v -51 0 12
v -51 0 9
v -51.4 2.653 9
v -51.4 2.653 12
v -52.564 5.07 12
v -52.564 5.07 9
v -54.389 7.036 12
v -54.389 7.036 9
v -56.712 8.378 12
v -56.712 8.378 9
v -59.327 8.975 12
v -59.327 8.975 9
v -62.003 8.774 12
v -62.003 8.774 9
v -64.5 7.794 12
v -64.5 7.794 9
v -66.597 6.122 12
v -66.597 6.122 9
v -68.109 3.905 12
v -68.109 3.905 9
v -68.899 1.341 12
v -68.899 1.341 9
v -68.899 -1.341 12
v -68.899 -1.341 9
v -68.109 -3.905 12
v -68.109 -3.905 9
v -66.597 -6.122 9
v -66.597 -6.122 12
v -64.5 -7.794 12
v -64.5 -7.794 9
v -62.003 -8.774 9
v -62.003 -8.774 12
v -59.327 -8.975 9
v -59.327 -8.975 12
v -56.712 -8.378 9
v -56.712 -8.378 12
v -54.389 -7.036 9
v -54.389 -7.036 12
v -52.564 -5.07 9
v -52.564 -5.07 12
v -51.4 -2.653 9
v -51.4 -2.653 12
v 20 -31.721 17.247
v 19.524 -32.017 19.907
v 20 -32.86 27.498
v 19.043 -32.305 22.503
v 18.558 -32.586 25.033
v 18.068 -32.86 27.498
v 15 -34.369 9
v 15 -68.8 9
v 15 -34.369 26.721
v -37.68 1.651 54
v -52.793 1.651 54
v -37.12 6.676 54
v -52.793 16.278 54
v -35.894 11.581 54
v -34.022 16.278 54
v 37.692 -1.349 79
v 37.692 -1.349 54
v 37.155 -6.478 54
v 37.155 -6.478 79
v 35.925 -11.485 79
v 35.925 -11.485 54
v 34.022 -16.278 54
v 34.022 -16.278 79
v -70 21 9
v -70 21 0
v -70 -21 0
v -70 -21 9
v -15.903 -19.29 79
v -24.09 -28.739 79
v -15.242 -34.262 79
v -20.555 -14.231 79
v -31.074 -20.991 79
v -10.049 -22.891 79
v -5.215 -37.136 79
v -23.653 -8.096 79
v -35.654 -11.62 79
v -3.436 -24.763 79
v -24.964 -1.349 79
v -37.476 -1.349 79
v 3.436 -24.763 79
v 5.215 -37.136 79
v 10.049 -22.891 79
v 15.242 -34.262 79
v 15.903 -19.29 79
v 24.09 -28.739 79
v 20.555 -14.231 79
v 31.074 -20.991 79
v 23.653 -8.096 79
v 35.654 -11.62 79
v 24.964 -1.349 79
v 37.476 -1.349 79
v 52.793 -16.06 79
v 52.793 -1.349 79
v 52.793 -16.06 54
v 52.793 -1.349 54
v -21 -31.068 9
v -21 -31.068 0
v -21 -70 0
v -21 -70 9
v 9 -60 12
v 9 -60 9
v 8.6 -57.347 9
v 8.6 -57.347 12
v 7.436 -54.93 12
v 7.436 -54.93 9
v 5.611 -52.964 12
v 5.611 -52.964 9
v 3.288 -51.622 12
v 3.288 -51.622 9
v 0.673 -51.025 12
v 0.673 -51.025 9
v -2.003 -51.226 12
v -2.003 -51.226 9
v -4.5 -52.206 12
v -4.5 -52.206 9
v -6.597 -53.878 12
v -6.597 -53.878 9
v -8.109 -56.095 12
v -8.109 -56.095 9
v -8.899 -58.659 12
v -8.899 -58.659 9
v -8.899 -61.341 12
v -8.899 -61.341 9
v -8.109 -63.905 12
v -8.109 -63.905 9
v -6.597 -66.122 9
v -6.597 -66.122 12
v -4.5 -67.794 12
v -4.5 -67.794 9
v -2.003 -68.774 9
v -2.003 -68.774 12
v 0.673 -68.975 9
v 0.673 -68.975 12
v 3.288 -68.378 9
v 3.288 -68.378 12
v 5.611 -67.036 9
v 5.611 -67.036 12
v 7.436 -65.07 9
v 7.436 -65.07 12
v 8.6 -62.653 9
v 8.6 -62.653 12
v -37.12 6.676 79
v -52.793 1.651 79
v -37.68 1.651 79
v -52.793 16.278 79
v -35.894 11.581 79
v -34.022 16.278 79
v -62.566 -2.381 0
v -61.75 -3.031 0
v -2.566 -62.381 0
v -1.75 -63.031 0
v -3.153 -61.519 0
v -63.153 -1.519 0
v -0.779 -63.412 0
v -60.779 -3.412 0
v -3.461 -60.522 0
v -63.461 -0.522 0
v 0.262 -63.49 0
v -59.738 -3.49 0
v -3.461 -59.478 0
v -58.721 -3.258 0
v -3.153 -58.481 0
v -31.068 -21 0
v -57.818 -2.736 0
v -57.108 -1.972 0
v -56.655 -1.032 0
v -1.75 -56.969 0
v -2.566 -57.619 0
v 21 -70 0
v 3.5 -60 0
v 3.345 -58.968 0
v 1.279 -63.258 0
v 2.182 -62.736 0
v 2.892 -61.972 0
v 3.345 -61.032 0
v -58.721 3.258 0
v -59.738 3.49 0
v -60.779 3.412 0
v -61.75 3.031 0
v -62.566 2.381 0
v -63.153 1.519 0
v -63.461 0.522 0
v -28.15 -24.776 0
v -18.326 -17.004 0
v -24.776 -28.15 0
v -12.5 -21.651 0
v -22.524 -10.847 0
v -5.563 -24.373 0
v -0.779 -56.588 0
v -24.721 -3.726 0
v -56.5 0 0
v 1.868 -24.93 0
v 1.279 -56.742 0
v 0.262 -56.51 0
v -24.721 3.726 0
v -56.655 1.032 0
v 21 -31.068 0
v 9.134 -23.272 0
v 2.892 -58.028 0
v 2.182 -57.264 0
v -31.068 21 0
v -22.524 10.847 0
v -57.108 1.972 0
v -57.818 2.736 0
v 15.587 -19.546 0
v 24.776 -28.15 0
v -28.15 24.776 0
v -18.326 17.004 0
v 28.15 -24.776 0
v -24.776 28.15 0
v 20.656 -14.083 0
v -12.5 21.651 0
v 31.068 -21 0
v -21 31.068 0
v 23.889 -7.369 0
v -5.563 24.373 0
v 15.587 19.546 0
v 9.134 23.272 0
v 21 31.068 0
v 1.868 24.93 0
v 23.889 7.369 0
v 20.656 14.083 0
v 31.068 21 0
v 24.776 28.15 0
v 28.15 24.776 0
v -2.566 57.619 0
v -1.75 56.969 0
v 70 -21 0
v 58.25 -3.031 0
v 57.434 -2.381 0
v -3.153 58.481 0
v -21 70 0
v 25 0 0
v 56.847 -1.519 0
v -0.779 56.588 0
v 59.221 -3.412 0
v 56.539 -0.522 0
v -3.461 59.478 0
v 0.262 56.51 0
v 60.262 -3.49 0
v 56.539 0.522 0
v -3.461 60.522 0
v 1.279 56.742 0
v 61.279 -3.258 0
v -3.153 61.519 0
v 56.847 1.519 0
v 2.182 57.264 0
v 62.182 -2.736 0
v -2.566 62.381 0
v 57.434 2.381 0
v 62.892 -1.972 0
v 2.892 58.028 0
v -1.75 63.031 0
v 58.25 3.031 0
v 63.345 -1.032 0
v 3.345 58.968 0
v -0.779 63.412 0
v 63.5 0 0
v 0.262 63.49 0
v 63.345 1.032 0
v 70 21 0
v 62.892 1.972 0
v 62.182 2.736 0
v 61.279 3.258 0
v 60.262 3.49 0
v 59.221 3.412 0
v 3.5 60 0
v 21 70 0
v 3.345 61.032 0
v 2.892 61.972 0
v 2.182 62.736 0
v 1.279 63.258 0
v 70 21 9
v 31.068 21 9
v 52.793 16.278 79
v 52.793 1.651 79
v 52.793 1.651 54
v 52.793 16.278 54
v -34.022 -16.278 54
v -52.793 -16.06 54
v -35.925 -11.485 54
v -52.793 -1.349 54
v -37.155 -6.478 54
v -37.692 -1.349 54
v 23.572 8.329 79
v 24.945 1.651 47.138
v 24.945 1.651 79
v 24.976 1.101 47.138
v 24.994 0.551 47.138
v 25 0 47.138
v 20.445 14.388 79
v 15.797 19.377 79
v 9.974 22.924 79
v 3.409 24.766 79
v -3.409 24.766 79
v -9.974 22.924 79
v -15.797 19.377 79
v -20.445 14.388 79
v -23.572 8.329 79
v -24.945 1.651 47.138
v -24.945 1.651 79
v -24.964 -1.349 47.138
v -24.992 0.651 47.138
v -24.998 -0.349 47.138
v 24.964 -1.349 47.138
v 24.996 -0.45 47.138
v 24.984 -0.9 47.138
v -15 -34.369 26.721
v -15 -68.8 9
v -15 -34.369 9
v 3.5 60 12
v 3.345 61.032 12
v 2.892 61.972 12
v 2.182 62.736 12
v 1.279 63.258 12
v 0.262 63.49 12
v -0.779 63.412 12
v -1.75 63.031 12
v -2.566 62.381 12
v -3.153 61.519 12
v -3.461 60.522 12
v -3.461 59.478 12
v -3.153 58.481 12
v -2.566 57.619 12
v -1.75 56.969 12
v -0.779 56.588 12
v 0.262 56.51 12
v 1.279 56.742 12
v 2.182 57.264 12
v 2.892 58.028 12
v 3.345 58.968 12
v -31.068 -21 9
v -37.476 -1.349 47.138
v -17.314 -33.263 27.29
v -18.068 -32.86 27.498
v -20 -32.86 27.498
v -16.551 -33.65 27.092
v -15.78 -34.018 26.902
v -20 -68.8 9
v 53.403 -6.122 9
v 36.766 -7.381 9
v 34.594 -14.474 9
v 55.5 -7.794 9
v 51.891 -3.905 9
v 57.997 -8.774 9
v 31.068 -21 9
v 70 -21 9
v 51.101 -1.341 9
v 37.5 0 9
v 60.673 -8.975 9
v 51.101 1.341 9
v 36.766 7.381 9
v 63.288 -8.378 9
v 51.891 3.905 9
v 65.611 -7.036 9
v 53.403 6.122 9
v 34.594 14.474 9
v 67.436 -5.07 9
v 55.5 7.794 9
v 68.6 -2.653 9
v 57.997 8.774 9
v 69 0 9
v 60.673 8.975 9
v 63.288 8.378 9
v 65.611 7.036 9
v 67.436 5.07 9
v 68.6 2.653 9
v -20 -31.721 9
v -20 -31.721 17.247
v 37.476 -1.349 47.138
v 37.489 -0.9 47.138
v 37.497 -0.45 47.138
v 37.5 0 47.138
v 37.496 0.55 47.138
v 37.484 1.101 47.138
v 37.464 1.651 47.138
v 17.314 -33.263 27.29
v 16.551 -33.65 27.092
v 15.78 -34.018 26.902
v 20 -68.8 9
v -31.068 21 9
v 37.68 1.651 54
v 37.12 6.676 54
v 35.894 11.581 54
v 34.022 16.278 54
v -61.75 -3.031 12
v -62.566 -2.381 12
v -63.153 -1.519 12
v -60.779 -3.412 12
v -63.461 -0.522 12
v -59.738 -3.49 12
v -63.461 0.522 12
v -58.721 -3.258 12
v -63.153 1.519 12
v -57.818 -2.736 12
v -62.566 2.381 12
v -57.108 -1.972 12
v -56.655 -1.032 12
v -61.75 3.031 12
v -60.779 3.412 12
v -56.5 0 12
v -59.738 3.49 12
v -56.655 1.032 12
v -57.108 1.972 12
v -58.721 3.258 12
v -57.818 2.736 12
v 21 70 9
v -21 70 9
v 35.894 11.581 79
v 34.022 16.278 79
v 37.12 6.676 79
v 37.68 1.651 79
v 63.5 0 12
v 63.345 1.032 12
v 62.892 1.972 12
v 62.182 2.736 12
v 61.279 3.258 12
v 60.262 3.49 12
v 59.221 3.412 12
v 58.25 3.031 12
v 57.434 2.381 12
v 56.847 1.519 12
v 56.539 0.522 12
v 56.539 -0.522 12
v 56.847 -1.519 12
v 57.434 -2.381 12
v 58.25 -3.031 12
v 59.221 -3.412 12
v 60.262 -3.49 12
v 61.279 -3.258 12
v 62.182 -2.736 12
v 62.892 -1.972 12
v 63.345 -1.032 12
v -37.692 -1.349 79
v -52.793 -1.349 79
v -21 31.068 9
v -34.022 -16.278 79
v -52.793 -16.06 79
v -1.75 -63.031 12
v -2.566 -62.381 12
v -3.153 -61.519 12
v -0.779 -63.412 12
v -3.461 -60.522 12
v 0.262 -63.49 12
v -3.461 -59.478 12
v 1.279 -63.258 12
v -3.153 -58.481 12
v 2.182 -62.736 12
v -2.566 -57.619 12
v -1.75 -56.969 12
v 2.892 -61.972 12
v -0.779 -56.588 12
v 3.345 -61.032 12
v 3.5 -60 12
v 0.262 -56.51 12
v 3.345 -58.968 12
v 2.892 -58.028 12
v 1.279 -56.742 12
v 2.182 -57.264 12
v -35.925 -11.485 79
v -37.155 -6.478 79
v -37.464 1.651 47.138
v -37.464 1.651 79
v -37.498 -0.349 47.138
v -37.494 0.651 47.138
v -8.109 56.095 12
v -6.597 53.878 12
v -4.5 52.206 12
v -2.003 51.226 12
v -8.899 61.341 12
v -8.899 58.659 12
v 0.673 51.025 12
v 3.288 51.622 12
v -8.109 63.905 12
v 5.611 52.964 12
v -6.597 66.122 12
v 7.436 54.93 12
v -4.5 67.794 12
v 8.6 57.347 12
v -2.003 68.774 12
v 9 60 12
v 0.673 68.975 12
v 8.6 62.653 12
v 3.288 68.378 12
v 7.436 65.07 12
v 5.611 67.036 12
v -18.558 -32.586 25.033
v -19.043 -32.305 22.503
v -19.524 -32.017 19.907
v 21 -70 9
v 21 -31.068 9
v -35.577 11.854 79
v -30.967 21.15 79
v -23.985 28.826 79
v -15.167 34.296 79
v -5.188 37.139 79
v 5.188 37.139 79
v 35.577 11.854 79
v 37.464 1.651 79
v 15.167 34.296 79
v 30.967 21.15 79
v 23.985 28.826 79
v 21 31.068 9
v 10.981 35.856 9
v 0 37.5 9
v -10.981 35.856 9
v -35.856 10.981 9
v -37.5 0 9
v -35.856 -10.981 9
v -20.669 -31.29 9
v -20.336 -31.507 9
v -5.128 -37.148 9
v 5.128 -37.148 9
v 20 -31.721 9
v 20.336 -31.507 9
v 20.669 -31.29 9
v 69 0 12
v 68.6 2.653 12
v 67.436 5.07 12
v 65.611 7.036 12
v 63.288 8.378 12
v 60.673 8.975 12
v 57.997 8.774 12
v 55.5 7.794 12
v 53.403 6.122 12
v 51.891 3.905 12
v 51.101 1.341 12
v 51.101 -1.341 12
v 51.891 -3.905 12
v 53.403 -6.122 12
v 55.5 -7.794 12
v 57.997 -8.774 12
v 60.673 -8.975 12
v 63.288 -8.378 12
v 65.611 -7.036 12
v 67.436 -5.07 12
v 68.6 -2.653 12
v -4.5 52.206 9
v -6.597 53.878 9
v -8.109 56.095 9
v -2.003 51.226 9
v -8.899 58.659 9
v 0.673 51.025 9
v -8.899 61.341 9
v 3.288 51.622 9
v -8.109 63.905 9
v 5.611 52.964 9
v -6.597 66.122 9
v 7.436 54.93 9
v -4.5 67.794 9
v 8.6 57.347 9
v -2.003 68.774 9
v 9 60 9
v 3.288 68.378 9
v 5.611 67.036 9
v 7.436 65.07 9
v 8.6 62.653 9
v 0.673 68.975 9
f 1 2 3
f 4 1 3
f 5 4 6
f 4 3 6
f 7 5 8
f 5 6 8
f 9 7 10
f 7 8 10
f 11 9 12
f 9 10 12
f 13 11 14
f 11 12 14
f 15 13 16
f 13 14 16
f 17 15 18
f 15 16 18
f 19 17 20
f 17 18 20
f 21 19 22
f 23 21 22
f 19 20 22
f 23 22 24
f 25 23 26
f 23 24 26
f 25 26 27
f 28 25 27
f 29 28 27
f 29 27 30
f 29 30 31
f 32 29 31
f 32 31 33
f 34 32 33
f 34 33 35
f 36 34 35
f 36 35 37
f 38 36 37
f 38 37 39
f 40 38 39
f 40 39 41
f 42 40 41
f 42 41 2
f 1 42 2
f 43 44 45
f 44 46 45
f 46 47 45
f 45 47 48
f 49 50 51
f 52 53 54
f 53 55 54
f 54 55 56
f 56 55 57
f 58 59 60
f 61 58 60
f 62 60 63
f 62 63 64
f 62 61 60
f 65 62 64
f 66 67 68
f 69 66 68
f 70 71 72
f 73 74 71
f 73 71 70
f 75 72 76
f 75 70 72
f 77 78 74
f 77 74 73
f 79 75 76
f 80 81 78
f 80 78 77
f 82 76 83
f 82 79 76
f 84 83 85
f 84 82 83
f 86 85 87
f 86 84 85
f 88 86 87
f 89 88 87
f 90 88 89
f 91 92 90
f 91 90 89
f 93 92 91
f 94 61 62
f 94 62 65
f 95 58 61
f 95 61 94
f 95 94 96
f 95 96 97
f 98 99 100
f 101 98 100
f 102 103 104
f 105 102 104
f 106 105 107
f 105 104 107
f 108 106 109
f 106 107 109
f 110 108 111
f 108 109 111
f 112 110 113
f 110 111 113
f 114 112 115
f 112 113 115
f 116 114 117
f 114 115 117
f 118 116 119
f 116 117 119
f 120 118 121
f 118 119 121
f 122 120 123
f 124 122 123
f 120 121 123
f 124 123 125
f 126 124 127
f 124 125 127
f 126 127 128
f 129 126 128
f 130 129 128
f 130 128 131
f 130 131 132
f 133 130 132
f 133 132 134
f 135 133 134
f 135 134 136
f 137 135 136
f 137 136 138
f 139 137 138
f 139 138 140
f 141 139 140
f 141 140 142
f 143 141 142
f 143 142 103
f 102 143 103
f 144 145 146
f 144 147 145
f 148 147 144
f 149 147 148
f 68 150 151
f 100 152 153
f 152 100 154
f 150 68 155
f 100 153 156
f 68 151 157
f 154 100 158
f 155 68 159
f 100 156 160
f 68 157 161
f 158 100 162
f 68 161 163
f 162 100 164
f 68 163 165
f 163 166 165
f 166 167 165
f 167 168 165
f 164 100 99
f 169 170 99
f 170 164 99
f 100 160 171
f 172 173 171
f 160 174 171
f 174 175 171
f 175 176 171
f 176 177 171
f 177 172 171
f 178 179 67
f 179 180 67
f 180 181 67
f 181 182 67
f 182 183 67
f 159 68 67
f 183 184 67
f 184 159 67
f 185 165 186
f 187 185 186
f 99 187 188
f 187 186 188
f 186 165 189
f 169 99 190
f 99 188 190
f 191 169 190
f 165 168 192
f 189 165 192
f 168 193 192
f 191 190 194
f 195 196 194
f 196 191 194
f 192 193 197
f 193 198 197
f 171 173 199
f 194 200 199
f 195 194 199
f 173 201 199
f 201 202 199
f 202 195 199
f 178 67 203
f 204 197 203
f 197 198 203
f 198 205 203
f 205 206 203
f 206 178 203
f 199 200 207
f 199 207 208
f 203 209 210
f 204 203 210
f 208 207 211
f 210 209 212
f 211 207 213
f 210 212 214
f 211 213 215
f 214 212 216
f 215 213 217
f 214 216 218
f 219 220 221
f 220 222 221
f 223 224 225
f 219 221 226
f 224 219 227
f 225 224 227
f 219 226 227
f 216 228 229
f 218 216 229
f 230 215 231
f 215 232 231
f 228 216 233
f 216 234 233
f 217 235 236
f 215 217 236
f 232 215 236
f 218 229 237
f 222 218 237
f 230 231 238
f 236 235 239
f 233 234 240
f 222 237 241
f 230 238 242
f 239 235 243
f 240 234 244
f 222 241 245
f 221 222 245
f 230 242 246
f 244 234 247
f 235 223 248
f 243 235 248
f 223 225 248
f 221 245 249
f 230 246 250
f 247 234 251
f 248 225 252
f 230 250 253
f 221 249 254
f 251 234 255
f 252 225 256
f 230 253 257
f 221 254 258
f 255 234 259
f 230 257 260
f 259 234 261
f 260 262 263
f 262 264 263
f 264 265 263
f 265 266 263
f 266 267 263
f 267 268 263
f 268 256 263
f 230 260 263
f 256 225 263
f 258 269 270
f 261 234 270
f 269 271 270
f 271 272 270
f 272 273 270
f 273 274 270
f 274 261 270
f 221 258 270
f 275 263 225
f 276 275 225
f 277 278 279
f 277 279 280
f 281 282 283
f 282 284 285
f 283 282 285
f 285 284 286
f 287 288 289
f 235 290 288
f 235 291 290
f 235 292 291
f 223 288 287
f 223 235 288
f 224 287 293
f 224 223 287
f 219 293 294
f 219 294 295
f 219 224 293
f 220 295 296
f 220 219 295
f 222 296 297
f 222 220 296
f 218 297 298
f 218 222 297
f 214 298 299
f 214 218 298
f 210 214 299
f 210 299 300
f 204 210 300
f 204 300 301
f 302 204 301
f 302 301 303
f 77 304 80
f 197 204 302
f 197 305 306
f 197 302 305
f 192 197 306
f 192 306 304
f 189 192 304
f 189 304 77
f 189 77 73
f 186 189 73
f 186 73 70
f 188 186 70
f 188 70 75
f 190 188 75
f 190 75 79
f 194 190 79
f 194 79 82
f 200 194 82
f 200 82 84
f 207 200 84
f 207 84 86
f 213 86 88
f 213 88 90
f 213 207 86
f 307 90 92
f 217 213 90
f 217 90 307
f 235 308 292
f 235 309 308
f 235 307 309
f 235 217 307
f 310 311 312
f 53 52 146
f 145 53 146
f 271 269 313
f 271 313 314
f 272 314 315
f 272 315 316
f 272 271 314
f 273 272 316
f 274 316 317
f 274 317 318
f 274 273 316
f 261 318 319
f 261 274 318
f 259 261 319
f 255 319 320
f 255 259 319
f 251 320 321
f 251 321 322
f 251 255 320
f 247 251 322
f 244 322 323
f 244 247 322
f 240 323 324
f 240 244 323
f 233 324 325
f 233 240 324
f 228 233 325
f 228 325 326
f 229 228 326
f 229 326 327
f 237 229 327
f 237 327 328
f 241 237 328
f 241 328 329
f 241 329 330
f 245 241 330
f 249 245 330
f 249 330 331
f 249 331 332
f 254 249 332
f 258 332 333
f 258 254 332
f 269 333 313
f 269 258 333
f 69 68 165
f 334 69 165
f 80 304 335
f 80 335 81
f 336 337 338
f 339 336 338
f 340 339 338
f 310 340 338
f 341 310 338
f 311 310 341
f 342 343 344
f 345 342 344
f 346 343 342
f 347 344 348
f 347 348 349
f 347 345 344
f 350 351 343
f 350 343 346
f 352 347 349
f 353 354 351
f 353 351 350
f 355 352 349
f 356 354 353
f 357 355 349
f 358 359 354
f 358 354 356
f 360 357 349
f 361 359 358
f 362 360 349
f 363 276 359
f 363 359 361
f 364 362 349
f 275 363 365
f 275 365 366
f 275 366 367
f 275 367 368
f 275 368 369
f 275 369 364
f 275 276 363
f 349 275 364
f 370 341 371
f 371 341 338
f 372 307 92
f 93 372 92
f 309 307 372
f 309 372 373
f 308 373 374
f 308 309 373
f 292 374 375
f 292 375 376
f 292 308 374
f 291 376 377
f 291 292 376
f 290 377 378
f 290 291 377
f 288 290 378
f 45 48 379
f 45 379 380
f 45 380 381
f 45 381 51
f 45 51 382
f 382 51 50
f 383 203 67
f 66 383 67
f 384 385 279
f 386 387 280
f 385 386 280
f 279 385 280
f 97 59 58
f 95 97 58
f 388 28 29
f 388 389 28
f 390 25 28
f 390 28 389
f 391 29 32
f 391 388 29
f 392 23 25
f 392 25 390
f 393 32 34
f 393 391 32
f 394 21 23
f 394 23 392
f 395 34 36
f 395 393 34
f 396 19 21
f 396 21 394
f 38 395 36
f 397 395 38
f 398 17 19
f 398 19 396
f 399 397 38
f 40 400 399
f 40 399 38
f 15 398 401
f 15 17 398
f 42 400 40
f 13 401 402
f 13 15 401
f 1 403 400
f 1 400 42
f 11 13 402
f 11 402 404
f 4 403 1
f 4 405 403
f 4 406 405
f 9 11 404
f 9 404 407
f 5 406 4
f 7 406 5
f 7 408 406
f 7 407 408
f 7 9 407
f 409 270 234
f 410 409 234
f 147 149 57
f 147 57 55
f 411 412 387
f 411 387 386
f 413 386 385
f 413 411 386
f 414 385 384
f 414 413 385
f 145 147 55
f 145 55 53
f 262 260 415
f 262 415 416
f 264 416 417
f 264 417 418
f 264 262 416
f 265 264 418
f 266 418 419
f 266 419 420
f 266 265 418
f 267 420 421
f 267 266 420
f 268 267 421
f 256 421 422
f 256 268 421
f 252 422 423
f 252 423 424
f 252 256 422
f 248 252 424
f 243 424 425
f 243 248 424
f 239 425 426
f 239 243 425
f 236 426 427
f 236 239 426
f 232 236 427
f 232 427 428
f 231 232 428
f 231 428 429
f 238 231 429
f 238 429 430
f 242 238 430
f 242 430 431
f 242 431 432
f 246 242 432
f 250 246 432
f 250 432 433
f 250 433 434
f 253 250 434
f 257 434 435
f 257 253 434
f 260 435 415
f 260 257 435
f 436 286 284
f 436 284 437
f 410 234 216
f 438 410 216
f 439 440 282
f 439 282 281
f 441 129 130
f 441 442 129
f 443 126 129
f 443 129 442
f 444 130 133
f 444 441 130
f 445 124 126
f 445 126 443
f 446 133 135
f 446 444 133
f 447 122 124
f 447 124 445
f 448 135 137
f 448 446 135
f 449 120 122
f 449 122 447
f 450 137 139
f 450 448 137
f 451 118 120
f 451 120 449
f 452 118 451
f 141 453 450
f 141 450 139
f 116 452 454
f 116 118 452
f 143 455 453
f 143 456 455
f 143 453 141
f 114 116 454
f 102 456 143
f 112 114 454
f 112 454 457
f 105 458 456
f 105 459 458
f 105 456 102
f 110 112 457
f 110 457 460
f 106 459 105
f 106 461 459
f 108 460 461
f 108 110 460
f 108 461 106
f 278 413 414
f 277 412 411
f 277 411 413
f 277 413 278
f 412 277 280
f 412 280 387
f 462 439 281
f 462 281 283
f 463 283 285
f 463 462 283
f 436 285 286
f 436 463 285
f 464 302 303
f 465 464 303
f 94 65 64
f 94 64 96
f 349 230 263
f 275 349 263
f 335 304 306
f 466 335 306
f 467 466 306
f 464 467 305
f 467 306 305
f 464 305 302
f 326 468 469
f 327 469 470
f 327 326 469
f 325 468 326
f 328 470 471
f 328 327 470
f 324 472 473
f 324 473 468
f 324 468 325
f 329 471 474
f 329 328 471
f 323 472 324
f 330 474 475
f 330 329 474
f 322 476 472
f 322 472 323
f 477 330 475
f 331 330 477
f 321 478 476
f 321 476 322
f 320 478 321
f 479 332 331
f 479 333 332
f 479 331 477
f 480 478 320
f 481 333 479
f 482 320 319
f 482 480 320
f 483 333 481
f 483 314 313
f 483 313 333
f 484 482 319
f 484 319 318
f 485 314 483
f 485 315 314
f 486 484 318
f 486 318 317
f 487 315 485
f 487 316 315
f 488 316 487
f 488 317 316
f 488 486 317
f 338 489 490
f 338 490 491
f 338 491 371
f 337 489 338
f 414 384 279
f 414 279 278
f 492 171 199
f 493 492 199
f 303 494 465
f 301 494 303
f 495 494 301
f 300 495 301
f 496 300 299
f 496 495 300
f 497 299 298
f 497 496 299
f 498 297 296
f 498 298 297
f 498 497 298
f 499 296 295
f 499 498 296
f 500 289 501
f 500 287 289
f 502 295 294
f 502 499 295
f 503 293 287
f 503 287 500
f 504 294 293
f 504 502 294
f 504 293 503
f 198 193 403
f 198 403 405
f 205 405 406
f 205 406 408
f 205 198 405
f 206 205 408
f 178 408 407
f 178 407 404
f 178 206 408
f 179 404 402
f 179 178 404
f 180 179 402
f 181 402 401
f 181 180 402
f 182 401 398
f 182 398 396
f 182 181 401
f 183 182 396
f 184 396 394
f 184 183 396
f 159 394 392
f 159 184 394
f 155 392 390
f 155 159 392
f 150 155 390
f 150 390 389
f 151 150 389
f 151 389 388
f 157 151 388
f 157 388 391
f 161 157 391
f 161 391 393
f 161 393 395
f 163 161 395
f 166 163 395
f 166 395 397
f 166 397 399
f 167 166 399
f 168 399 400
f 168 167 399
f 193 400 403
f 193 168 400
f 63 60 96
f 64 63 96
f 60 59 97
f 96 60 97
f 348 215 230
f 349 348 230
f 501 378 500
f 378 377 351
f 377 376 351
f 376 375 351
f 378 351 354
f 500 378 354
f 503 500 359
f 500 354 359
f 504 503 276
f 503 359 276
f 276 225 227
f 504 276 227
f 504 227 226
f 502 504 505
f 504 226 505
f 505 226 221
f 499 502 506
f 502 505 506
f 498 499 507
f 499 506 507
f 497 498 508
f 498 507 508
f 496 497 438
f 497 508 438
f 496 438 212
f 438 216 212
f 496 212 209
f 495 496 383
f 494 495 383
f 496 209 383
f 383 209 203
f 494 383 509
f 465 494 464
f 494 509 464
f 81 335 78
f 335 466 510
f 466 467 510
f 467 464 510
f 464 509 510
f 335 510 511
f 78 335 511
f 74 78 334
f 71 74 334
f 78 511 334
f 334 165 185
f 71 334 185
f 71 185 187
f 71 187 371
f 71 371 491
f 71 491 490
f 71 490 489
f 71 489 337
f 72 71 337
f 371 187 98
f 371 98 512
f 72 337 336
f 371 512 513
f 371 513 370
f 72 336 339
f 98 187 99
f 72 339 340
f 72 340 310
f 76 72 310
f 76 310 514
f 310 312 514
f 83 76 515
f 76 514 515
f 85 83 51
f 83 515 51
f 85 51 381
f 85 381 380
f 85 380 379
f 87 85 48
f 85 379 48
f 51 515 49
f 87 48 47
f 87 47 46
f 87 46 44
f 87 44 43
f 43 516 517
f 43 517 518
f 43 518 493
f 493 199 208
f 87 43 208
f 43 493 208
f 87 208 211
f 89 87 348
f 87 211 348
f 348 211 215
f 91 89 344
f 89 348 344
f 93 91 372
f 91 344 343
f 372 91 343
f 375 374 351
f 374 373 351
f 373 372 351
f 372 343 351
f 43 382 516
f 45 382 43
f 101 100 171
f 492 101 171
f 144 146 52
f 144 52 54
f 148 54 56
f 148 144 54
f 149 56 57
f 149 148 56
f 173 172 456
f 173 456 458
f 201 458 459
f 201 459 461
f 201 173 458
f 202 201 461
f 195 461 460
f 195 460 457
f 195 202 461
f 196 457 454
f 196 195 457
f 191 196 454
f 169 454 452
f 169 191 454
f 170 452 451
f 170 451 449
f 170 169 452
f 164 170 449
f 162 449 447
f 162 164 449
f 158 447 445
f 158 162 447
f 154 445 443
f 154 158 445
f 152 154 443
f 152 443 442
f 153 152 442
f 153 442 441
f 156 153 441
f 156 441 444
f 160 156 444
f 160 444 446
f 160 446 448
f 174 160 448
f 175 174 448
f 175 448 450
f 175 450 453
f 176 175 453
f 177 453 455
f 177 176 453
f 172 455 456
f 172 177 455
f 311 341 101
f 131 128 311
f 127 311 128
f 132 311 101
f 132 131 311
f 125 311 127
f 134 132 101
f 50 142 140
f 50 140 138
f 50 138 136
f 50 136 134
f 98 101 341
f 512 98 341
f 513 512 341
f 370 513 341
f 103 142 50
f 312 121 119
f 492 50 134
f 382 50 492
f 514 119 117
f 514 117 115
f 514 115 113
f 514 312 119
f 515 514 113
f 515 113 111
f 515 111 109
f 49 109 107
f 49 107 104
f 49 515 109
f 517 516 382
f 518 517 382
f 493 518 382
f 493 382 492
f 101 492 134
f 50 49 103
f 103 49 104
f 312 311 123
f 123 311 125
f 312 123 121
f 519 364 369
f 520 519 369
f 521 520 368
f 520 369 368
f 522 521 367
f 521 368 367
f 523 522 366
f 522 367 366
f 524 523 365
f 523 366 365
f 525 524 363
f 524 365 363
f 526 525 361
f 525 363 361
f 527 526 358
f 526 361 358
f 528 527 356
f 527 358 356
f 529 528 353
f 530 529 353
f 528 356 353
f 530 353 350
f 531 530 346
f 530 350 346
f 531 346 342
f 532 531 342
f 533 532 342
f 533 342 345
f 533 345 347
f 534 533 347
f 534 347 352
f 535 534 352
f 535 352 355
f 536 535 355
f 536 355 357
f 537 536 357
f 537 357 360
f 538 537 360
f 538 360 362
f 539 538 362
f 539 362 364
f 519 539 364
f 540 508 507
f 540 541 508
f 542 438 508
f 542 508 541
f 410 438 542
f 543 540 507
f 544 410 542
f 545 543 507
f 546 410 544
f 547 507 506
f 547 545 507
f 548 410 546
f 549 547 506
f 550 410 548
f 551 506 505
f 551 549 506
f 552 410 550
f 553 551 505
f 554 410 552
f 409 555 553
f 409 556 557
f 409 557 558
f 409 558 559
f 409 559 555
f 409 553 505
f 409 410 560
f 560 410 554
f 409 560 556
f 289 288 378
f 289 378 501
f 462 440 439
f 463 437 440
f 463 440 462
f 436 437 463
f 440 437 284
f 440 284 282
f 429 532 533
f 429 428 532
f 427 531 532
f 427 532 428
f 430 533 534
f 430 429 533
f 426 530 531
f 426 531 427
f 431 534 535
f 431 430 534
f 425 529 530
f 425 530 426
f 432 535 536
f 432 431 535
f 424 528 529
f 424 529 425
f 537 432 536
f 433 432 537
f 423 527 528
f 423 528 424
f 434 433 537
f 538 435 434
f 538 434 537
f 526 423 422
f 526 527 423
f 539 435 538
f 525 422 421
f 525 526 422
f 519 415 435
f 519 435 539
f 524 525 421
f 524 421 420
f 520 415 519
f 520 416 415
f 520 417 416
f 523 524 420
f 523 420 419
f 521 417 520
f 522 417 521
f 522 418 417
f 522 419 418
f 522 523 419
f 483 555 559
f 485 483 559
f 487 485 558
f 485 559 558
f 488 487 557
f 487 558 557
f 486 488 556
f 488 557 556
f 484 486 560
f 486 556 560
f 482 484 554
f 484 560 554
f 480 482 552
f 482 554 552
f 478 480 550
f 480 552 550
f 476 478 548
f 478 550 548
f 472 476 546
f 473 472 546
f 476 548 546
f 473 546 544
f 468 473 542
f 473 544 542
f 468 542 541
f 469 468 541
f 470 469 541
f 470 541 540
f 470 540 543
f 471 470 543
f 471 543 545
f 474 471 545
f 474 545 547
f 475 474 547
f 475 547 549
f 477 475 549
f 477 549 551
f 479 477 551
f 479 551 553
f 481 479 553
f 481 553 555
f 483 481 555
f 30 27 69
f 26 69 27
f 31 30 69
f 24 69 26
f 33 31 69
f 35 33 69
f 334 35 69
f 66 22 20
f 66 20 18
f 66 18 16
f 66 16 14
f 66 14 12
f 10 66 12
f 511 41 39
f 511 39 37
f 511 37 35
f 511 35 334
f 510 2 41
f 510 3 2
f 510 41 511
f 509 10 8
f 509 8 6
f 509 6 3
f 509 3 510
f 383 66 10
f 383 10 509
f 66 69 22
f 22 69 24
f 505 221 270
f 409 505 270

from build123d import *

# Parameters (mm, degrees)
F0_R      = 37.5
F0_R_2    = 25
F1_DEPTH  = 79
F3_DEPTH  = 9
F4_R      = 4
F5_DEPTH  = 10
F6_DEPTH  = 25
F7_R      = 9
F7_R_2    = 3.5
F8_DEPTH  = 12
F12_DEPTH = 25
F9_W      = 3
F9_H      = 35
F13_DEPTH = 70.001
F14_DEPTH = 70.001
F17_DEPTH = 5


# Not quite as in the source:
# - a pattern or mirror of a feature is missing from the dataset's text; its kind, count and spacing are read off the source's solid


with BuildPart() as f1:
    # F0 (on Top) → F1 (new body)
    with BuildSketch(Plane.XY):
        Circle(F0_R)
        Circle(F0_R_2, mode=Mode.SUBTRACT)
    extrude(amount=F1_DEPTH)

    # F2 (on Top) → F3 (join)
    with BuildSketch(Plane.XY):
        with BuildLine():
            Line((-21, 70), (-21, 31.0684727658))
            ThreePointArc((-21, 31.0684727658), (0, 37.5), (21, 31.0684727658))
            Line((21, 31.0684727658), (21, 70))
            Line((21, 70), (-21, 70))
        make_face()
        with BuildLine():
            Line((-70, -21), (-31.0684727658, -21))
            ThreePointArc((-31.0684727658, -21), (-37.5, 0), (-31.0684727658, 21))
            Line((-31.0684727658, 21), (-70, 21))
            Line((-70, 21), (-70, -21))
        make_face()
        with BuildLine():
            Line((21, -70), (21, -31.0684727658))
            ThreePointArc((21, -31.0684727658), (0, -37.5), (-21, -31.0684727658))
            Line((-21, -31.0684727658), (-21, -70))
            Line((-21, -70), (21, -70))
        make_face()
        with BuildLine():
            Line((70, 21), (31.0684727658, 21))
            ThreePointArc((31.0684727658, 21), (37.5, 0), (31.0684727658, -21))
            Line((31.0684727658, -21), (70, -21))
            Line((70, -21), (70, 21))
        make_face()
    extrude(amount=F3_DEPTH)

    # F4 (on Top) → F5 (cut)
    with BuildSketch(Plane.XY):
        with Locations((-60, 0)):
            Circle(F4_R)
        with Locations((0, -60)):
            Circle(F4_R)
        with Locations((60, 0)):
            Circle(F4_R)
        with Locations((0, 60)):
            Circle(F4_R)
    extrude(amount=F5_DEPTH, mode=Mode.SUBTRACT)

    # F4 (on Top) → F6 (cut)
    with BuildSketch(Plane.XY):
        with Locations((-60, 0)):
            Circle(F4_R)
        with Locations((0, -60)):
            Circle(F4_R)
        with Locations((60, 0)):
            Circle(F4_R)
        with Locations((0, 60)):
            Circle(F4_R)
    extrude(amount=F6_DEPTH, mode=Mode.SUBTRACT)

    # F7 (on Top) → F8 (join)
    with BuildSketch(Plane.XY):
        with Locations((-60, 0)):
            Circle(F7_R)
        with Locations((-60, 0)):
            Circle(F7_R_2, mode=Mode.SUBTRACT)
        with Locations((0, -60)):
            Circle(F7_R)
        with Locations((0, -60)):
            Circle(F7_R_2, mode=Mode.SUBTRACT)
        with Locations((60, 0)):
            Circle(F7_R)
        with Locations((60, 0)):
            Circle(F7_R_2, mode=Mode.SUBTRACT)
        with Locations((0, 60)):
            Circle(F7_R)
        with Locations((0, 60)):
            Circle(F7_R_2, mode=Mode.SUBTRACT)
    extrude(amount=F8_DEPTH)


with BuildPart() as f12:
    # F11 (on offset) → F12 (new body)
    with BuildSketch(Plane.XY.offset(79)):
        with BuildLine():
            Line((52.7932941914, 16.2779334933), (34.0223498642, 16.2779334933))
            ThreePointArc((34.0223498642, 16.2779334933), (37.7159304419, 0), (34.0223498642, -16.2779334933))
            Line((34.0223498642, -16.2779334933), (52.7932941914, -16.0596668599))
            Line((52.7932941914, -16.0596668599), (52.7932941914, 16.2779334933))
        make_face()
    extrude(amount=-F12_DEPTH)


with BuildPart() as f12b:
    # F11 (on offset) → F12, piece 2 (new body)
    with BuildSketch(Plane.XY.offset(79)):
        with BuildLine():
            ThreePointArc((-34.0223498642, -16.2779334933), (-37.7159304419, 0), (-34.0223498642, 16.2779334933))
            Line((-34.0223498642, 16.2779334933), (-52.7932941914, 16.2779334933))
            Line((-52.7932941914, 16.2779334933), (-52.7932941914, -16.0596668599))
            Line((-52.7932941914, -16.0596668599), (-34.0223498642, -16.2779334933))
        make_face()
    extrude(amount=-F12_DEPTH)


with BuildPart() as f13_tool:
    # F9 (on Right) → F13 (new body, through all)
    with BuildSketch(Plane.YZ):
        with Locations((0.1505599357, 64.6378623207)):
            Rectangle(F9_W, F9_H)
    extrude(amount=-F13_DEPTH)


with BuildPart() as f1_1:
    add(f1.part)

    # F13: cut by f13_tool
    add(f13_tool.part, mode=Mode.SUBTRACT)


with BuildPart() as f12b_1:
    add(f12b.part)

    # F13: cut by f13_tool
    add(f13_tool.part, mode=Mode.SUBTRACT)


with BuildPart() as f14_tool:
    # F9 (on Right) → F14 (new body, through all)
    with BuildSketch(Plane.YZ):
        with Locations((0.1505599357, 64.6378623207)):
            Rectangle(F9_W, F9_H)
    extrude(amount=F14_DEPTH)


with BuildPart() as f1_2:
    add(f1_1.part)

    # F14: cut by f14_tool
    add(f14_tool.part, mode=Mode.SUBTRACT)

    # F16 (on offset) → F17 (join)
    with BuildSketch(Plane.YZ.offset(15)):
        Polygon((-30.7767703821, 8.7426423561), (-32.8600216546, 27.4980076705), (-69.2997624506, 8.7426423561), align=None)
    f17 = extrude(amount=F17_DEPTH)

    # F17_copies: F17 across plane
    add(f17.mirror(Plane(origin=(0, 0, 0), x_dir=(0, 0, -1), z_dir=(-1, 0, 0))))


with BuildPart() as f12_1:
    add(f12.part)

    # F14: cut by f14_tool
    add(f14_tool.part, mode=Mode.SUBTRACT)


solid = Compound([f12b_1.part, f1_2.part, f12_1.part])
